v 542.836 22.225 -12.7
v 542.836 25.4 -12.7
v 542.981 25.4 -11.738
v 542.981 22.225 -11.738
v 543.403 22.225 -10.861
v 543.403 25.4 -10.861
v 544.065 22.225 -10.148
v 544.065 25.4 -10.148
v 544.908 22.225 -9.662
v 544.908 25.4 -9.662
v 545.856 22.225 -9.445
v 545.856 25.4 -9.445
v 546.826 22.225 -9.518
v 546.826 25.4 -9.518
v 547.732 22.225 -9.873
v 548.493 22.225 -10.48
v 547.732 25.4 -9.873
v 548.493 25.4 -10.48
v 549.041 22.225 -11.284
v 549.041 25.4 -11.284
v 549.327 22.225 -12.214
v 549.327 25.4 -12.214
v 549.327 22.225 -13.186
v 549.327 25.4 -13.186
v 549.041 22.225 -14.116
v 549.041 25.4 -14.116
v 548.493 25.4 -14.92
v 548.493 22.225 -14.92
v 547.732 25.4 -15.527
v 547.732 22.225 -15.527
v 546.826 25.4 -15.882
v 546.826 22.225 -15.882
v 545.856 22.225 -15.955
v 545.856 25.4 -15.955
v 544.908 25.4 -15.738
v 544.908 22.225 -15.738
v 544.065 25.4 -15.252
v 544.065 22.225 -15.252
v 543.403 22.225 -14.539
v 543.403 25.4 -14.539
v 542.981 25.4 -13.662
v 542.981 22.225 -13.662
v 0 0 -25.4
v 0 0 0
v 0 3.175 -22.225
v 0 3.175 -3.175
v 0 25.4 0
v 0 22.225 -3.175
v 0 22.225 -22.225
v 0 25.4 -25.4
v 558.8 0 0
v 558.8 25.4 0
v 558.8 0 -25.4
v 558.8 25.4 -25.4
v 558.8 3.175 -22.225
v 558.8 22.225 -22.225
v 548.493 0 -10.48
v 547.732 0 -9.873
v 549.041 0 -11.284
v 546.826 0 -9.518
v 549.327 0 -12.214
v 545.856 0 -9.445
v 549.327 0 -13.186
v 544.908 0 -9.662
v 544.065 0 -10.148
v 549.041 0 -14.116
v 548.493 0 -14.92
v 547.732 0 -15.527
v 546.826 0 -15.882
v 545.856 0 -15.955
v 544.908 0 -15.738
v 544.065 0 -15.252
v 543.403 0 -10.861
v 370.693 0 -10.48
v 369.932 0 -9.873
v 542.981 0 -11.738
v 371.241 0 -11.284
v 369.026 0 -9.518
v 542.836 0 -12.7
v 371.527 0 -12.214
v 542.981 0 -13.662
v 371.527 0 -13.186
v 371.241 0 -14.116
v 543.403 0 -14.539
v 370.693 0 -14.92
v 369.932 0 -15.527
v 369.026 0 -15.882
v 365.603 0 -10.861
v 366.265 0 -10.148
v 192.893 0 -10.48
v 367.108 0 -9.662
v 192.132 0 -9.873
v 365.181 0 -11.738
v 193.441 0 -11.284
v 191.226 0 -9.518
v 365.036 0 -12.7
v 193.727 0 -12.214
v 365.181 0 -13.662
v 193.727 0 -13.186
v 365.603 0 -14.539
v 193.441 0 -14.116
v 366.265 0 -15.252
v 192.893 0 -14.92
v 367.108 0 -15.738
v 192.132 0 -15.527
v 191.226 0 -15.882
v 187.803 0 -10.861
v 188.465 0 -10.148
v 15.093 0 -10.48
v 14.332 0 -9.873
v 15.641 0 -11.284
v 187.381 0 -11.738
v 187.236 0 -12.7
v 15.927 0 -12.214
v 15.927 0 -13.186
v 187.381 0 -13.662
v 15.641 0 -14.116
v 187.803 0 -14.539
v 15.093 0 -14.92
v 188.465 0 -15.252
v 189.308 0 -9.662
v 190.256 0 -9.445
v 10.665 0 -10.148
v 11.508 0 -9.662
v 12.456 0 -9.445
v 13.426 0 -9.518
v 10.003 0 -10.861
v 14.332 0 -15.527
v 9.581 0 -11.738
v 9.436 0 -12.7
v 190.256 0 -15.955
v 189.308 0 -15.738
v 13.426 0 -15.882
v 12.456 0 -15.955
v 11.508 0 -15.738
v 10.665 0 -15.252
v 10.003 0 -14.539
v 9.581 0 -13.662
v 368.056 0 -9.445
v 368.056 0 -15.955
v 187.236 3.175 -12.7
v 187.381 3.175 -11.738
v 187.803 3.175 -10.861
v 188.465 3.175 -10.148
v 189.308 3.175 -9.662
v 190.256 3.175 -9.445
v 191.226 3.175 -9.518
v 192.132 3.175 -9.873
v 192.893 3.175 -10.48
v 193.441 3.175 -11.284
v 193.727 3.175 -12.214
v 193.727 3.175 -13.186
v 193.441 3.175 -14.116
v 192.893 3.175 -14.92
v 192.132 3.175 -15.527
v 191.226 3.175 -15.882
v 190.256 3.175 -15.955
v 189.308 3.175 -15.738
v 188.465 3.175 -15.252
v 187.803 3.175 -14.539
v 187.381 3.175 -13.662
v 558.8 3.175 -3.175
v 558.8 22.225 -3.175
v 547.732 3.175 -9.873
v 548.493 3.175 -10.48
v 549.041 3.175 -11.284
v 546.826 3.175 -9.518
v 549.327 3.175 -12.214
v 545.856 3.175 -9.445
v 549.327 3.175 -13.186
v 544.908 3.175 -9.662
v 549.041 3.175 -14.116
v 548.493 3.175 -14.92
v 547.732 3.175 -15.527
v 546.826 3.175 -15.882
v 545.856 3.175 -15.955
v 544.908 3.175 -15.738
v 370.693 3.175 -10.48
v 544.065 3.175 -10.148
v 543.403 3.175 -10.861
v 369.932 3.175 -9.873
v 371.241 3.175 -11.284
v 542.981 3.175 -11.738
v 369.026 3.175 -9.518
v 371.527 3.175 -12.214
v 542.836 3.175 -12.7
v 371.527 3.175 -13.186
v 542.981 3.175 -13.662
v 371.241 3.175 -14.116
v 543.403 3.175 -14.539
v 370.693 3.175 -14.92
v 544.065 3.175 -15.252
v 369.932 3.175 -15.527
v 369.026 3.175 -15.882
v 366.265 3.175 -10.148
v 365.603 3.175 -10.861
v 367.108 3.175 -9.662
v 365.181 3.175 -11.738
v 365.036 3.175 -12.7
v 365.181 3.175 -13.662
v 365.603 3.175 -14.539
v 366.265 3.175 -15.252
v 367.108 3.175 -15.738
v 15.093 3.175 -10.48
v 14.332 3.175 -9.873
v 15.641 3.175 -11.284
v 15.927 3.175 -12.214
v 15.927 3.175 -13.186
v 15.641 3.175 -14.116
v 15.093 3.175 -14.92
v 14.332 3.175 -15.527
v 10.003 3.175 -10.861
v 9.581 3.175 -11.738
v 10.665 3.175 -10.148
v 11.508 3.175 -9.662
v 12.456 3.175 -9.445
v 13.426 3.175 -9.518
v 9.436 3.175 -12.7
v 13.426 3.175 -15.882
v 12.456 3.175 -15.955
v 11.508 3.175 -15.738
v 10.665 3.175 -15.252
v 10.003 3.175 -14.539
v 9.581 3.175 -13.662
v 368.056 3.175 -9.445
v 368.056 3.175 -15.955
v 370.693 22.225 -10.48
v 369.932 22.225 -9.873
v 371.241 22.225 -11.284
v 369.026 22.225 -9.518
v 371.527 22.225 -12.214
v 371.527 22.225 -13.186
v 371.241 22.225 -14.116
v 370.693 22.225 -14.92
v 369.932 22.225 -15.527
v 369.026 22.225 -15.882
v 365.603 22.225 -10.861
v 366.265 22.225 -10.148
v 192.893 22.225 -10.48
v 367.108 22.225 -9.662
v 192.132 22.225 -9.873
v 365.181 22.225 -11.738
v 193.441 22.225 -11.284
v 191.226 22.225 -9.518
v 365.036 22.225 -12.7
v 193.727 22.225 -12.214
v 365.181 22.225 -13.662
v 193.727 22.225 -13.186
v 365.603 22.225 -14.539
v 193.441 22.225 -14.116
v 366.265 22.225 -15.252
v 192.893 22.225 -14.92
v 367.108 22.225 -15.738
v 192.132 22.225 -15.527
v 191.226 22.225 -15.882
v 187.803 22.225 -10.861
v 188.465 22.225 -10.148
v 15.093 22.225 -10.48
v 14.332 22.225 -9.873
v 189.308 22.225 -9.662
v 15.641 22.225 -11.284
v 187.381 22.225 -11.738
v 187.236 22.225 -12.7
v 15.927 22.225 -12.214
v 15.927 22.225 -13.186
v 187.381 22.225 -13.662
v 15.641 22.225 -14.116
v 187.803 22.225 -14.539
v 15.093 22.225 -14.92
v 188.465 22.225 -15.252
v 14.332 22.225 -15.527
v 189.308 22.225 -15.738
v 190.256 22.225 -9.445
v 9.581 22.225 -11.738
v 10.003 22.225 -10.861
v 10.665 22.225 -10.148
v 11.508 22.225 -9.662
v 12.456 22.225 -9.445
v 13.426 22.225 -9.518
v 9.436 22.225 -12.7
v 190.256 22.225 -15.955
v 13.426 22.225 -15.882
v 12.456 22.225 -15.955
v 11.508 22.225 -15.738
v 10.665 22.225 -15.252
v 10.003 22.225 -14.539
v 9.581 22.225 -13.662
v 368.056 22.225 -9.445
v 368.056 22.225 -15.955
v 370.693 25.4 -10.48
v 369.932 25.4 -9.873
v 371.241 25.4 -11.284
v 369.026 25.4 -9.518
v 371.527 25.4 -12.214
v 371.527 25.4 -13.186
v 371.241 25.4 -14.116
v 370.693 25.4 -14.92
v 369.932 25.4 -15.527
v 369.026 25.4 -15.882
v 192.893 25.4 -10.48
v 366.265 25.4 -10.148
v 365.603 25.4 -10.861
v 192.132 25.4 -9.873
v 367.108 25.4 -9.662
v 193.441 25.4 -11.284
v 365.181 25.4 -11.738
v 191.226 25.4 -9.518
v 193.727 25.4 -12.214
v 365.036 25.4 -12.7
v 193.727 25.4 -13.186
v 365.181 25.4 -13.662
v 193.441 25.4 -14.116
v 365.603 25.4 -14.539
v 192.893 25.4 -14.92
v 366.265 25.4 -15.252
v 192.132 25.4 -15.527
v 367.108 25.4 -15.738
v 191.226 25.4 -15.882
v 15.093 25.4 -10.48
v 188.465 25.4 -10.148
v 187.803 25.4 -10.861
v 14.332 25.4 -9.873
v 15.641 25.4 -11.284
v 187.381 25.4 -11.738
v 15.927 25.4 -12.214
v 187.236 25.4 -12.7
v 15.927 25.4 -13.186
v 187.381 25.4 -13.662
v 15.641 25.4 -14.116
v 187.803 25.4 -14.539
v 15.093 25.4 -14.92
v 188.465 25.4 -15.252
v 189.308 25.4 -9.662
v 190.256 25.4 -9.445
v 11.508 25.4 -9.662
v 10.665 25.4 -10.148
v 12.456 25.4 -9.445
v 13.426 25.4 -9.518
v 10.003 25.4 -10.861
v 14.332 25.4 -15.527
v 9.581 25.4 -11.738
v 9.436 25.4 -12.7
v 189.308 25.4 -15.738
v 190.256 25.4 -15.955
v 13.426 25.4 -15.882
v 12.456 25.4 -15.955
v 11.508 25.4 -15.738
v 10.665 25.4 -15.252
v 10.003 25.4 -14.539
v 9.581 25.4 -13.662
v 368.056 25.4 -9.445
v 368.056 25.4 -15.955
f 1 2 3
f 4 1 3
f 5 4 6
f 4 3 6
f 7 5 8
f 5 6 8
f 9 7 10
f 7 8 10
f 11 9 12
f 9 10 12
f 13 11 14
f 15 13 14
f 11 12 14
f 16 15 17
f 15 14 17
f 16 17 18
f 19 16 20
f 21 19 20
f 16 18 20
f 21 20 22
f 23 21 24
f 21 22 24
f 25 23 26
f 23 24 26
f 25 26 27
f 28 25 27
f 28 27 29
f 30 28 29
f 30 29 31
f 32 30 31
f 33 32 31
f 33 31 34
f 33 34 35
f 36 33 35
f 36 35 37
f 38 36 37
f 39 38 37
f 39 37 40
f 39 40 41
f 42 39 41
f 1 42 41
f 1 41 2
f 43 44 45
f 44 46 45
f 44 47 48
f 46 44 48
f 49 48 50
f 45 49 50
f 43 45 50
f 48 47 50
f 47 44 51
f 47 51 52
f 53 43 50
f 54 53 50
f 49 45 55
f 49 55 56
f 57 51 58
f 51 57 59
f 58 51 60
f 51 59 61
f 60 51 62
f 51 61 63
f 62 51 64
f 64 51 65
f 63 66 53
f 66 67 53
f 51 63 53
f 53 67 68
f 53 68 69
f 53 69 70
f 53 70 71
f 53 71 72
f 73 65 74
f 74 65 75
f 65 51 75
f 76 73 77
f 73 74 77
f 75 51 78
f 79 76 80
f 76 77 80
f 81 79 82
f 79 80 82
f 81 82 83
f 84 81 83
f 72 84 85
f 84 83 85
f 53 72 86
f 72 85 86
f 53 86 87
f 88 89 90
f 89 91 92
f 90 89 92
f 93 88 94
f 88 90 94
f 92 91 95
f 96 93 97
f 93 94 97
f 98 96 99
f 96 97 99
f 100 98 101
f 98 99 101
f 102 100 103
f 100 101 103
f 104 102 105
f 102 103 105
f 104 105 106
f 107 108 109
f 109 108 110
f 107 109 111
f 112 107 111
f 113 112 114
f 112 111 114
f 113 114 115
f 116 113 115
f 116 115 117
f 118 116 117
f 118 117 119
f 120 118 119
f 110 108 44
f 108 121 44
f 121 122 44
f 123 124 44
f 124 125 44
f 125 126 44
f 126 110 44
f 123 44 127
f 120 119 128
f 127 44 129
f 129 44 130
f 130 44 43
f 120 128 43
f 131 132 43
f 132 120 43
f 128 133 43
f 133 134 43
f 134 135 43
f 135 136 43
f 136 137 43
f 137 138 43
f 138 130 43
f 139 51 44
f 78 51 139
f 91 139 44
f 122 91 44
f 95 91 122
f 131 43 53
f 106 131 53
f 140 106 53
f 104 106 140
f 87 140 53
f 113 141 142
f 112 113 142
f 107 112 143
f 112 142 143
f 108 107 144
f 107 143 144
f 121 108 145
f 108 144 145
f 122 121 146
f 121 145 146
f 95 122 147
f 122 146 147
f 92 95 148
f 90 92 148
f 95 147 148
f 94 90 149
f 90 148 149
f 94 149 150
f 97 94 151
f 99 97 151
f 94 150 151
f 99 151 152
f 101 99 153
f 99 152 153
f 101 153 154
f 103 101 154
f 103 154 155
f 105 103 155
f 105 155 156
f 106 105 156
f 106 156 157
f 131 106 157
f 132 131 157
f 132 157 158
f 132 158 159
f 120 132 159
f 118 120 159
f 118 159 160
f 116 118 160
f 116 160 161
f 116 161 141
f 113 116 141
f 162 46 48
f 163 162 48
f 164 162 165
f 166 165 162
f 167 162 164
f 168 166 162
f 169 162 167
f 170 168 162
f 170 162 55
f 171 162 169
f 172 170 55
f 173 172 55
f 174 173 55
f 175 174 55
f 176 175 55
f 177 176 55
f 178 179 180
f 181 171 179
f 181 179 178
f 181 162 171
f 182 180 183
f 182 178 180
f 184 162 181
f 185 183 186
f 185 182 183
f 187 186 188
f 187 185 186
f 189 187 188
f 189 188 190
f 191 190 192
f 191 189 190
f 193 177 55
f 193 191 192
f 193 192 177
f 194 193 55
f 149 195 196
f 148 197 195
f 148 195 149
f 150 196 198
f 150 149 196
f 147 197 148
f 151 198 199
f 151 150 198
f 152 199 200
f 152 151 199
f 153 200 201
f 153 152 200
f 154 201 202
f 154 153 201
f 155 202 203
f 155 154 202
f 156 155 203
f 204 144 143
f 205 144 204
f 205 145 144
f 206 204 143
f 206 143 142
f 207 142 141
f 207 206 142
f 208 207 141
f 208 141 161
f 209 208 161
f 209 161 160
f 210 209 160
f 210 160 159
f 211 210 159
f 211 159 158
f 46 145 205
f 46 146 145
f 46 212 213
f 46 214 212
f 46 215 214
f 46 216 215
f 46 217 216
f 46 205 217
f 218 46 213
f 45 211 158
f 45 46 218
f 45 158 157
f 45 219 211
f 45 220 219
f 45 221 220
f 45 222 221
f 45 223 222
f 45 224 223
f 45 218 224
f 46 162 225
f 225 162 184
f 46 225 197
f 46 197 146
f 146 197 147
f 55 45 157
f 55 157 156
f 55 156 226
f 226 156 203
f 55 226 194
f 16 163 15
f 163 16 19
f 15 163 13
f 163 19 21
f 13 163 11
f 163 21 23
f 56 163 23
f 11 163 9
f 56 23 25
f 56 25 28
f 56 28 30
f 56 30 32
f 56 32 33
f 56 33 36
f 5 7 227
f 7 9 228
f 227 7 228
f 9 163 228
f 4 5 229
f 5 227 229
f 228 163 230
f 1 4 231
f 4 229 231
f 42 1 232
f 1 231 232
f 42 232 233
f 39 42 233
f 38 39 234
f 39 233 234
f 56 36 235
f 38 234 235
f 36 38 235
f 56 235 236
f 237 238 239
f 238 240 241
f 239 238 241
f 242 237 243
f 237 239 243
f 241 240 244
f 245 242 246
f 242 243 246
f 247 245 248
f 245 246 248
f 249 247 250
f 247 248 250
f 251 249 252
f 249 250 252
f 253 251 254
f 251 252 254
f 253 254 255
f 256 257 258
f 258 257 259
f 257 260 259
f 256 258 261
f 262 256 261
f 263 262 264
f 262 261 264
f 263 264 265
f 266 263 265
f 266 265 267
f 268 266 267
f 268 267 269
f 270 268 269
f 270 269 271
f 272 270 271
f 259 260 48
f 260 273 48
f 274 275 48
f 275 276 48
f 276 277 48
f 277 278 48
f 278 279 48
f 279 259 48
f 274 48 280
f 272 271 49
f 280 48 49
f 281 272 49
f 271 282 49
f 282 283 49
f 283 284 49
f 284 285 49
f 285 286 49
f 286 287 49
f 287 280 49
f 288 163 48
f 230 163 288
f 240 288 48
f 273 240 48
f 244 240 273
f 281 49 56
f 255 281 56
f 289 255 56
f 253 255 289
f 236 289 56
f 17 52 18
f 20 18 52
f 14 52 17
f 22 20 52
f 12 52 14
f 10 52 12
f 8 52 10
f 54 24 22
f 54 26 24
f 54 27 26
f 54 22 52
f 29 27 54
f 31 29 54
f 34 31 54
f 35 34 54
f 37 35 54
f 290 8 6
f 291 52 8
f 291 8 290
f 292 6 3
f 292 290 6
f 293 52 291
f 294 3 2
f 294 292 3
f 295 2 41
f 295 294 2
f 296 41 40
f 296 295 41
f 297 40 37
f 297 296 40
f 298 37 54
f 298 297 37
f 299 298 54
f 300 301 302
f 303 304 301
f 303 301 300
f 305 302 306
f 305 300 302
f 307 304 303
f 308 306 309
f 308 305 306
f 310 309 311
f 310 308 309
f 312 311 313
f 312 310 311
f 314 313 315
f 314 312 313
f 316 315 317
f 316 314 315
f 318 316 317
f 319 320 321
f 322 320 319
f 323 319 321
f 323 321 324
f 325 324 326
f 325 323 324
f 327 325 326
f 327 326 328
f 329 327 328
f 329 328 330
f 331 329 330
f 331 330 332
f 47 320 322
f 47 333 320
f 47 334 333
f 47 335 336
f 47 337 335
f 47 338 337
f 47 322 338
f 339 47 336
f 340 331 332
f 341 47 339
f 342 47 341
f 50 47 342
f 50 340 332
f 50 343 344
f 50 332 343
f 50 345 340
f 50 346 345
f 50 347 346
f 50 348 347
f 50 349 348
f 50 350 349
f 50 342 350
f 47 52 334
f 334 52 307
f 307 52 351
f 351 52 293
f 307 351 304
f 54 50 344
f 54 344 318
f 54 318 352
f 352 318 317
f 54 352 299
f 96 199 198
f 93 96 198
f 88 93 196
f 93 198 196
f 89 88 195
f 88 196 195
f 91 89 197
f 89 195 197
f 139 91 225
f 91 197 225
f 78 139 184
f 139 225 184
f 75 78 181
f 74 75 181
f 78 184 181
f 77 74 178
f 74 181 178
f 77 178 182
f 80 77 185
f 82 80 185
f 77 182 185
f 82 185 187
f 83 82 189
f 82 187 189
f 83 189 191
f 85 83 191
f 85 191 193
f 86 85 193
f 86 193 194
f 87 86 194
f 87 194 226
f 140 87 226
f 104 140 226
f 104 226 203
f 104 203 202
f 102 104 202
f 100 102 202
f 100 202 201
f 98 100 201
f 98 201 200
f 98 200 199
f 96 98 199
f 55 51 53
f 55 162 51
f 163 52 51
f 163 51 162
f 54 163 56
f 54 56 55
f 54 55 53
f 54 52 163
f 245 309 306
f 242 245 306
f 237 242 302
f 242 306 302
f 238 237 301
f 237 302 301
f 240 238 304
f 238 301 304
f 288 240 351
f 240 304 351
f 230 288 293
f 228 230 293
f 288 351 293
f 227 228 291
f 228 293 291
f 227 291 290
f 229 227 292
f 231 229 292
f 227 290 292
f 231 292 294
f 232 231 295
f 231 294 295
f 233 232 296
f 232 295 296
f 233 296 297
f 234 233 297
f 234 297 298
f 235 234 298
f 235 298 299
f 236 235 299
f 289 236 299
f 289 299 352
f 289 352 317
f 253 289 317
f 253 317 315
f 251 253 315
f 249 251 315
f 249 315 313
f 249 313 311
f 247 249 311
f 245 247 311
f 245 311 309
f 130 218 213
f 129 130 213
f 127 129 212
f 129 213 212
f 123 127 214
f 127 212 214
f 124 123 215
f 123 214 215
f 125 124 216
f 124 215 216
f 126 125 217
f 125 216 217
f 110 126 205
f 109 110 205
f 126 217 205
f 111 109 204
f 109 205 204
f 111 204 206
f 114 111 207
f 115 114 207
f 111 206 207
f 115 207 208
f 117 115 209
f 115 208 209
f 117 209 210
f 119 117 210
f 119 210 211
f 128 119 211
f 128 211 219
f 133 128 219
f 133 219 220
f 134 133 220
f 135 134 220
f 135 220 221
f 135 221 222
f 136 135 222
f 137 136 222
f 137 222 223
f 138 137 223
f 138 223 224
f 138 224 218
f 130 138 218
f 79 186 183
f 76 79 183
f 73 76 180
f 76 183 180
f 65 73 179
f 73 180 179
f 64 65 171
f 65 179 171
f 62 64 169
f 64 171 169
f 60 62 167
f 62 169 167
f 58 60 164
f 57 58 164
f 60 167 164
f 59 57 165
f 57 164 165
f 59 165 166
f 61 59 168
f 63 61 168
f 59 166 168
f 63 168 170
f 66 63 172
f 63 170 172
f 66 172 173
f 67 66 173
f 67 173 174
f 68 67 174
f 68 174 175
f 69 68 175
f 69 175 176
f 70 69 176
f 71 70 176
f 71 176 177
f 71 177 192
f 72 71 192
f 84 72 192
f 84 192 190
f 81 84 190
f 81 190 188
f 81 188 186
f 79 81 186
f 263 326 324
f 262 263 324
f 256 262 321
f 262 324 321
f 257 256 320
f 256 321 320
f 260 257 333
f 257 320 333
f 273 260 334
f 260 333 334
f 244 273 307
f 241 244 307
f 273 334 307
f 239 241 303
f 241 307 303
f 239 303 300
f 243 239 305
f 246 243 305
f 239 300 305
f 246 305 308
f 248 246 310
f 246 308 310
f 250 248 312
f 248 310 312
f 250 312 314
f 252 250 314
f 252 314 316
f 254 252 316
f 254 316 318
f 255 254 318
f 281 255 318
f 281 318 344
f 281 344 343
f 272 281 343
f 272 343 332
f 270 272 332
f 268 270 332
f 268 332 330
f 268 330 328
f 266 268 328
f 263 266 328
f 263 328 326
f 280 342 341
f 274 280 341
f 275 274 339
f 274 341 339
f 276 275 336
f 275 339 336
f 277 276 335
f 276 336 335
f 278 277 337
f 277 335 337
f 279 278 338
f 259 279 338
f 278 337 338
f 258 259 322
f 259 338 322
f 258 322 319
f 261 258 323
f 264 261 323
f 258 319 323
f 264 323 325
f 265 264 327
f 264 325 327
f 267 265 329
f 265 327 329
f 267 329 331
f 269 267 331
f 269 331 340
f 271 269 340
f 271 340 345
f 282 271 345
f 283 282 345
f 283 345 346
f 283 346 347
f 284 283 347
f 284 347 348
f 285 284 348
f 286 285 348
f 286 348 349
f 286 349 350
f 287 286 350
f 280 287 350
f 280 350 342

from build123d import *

# Parameters (mm, degrees)
SKETCH1_W          = 25.4
SKETCH1_H          = 25.4
SKETCH1_W_2        = 19.05
SKETCH1_H_2        = 19.05
EXTRUDE1_DEPTH     = 558.8
SKETCH2_R          = 3.2639
CUT_EXTRUDE1_DEPTH = 26.4


with BuildPart() as part:
    # Sketch1 → Extrude1 (new body)
    with BuildSketch(Plane(origin=(0, 0, 0), x_dir=(0, 0, -1), z_dir=(1, 0, 0))):
        with Locations((12.7, 12.7)):
            Rectangle(SKETCH1_W, SKETCH1_H)
        with Locations((12.7, 12.7)):
            Rectangle(SKETCH1_W_2, SKETCH1_H_2, mode=Mode.SUBTRACT)
    extrude(amount=EXTRUDE1_DEPTH)

    # Sketch2 → Cut-Extrude1 (cut, through all)
    with BuildSketch(Plane(origin=(0, 25.4, 0), x_dir=(-1, 0, 0), z_dir=(0, 1, 0))):
        with Locations((-546.1, -12.7)):
            Circle(SKETCH2_R)
        with Locations((-368.3, -12.7)):
            Circle(SKETCH2_R)
        with Locations((-190.5, -12.7)):
            Circle(SKETCH2_R)
        with Locations((-12.7, -12.7)):
            Circle(SKETCH2_R)
    extrude(amount=-CUT_EXTRUDE1_DEPTH, mode=Mode.SUBTRACT)


solid = part.part
